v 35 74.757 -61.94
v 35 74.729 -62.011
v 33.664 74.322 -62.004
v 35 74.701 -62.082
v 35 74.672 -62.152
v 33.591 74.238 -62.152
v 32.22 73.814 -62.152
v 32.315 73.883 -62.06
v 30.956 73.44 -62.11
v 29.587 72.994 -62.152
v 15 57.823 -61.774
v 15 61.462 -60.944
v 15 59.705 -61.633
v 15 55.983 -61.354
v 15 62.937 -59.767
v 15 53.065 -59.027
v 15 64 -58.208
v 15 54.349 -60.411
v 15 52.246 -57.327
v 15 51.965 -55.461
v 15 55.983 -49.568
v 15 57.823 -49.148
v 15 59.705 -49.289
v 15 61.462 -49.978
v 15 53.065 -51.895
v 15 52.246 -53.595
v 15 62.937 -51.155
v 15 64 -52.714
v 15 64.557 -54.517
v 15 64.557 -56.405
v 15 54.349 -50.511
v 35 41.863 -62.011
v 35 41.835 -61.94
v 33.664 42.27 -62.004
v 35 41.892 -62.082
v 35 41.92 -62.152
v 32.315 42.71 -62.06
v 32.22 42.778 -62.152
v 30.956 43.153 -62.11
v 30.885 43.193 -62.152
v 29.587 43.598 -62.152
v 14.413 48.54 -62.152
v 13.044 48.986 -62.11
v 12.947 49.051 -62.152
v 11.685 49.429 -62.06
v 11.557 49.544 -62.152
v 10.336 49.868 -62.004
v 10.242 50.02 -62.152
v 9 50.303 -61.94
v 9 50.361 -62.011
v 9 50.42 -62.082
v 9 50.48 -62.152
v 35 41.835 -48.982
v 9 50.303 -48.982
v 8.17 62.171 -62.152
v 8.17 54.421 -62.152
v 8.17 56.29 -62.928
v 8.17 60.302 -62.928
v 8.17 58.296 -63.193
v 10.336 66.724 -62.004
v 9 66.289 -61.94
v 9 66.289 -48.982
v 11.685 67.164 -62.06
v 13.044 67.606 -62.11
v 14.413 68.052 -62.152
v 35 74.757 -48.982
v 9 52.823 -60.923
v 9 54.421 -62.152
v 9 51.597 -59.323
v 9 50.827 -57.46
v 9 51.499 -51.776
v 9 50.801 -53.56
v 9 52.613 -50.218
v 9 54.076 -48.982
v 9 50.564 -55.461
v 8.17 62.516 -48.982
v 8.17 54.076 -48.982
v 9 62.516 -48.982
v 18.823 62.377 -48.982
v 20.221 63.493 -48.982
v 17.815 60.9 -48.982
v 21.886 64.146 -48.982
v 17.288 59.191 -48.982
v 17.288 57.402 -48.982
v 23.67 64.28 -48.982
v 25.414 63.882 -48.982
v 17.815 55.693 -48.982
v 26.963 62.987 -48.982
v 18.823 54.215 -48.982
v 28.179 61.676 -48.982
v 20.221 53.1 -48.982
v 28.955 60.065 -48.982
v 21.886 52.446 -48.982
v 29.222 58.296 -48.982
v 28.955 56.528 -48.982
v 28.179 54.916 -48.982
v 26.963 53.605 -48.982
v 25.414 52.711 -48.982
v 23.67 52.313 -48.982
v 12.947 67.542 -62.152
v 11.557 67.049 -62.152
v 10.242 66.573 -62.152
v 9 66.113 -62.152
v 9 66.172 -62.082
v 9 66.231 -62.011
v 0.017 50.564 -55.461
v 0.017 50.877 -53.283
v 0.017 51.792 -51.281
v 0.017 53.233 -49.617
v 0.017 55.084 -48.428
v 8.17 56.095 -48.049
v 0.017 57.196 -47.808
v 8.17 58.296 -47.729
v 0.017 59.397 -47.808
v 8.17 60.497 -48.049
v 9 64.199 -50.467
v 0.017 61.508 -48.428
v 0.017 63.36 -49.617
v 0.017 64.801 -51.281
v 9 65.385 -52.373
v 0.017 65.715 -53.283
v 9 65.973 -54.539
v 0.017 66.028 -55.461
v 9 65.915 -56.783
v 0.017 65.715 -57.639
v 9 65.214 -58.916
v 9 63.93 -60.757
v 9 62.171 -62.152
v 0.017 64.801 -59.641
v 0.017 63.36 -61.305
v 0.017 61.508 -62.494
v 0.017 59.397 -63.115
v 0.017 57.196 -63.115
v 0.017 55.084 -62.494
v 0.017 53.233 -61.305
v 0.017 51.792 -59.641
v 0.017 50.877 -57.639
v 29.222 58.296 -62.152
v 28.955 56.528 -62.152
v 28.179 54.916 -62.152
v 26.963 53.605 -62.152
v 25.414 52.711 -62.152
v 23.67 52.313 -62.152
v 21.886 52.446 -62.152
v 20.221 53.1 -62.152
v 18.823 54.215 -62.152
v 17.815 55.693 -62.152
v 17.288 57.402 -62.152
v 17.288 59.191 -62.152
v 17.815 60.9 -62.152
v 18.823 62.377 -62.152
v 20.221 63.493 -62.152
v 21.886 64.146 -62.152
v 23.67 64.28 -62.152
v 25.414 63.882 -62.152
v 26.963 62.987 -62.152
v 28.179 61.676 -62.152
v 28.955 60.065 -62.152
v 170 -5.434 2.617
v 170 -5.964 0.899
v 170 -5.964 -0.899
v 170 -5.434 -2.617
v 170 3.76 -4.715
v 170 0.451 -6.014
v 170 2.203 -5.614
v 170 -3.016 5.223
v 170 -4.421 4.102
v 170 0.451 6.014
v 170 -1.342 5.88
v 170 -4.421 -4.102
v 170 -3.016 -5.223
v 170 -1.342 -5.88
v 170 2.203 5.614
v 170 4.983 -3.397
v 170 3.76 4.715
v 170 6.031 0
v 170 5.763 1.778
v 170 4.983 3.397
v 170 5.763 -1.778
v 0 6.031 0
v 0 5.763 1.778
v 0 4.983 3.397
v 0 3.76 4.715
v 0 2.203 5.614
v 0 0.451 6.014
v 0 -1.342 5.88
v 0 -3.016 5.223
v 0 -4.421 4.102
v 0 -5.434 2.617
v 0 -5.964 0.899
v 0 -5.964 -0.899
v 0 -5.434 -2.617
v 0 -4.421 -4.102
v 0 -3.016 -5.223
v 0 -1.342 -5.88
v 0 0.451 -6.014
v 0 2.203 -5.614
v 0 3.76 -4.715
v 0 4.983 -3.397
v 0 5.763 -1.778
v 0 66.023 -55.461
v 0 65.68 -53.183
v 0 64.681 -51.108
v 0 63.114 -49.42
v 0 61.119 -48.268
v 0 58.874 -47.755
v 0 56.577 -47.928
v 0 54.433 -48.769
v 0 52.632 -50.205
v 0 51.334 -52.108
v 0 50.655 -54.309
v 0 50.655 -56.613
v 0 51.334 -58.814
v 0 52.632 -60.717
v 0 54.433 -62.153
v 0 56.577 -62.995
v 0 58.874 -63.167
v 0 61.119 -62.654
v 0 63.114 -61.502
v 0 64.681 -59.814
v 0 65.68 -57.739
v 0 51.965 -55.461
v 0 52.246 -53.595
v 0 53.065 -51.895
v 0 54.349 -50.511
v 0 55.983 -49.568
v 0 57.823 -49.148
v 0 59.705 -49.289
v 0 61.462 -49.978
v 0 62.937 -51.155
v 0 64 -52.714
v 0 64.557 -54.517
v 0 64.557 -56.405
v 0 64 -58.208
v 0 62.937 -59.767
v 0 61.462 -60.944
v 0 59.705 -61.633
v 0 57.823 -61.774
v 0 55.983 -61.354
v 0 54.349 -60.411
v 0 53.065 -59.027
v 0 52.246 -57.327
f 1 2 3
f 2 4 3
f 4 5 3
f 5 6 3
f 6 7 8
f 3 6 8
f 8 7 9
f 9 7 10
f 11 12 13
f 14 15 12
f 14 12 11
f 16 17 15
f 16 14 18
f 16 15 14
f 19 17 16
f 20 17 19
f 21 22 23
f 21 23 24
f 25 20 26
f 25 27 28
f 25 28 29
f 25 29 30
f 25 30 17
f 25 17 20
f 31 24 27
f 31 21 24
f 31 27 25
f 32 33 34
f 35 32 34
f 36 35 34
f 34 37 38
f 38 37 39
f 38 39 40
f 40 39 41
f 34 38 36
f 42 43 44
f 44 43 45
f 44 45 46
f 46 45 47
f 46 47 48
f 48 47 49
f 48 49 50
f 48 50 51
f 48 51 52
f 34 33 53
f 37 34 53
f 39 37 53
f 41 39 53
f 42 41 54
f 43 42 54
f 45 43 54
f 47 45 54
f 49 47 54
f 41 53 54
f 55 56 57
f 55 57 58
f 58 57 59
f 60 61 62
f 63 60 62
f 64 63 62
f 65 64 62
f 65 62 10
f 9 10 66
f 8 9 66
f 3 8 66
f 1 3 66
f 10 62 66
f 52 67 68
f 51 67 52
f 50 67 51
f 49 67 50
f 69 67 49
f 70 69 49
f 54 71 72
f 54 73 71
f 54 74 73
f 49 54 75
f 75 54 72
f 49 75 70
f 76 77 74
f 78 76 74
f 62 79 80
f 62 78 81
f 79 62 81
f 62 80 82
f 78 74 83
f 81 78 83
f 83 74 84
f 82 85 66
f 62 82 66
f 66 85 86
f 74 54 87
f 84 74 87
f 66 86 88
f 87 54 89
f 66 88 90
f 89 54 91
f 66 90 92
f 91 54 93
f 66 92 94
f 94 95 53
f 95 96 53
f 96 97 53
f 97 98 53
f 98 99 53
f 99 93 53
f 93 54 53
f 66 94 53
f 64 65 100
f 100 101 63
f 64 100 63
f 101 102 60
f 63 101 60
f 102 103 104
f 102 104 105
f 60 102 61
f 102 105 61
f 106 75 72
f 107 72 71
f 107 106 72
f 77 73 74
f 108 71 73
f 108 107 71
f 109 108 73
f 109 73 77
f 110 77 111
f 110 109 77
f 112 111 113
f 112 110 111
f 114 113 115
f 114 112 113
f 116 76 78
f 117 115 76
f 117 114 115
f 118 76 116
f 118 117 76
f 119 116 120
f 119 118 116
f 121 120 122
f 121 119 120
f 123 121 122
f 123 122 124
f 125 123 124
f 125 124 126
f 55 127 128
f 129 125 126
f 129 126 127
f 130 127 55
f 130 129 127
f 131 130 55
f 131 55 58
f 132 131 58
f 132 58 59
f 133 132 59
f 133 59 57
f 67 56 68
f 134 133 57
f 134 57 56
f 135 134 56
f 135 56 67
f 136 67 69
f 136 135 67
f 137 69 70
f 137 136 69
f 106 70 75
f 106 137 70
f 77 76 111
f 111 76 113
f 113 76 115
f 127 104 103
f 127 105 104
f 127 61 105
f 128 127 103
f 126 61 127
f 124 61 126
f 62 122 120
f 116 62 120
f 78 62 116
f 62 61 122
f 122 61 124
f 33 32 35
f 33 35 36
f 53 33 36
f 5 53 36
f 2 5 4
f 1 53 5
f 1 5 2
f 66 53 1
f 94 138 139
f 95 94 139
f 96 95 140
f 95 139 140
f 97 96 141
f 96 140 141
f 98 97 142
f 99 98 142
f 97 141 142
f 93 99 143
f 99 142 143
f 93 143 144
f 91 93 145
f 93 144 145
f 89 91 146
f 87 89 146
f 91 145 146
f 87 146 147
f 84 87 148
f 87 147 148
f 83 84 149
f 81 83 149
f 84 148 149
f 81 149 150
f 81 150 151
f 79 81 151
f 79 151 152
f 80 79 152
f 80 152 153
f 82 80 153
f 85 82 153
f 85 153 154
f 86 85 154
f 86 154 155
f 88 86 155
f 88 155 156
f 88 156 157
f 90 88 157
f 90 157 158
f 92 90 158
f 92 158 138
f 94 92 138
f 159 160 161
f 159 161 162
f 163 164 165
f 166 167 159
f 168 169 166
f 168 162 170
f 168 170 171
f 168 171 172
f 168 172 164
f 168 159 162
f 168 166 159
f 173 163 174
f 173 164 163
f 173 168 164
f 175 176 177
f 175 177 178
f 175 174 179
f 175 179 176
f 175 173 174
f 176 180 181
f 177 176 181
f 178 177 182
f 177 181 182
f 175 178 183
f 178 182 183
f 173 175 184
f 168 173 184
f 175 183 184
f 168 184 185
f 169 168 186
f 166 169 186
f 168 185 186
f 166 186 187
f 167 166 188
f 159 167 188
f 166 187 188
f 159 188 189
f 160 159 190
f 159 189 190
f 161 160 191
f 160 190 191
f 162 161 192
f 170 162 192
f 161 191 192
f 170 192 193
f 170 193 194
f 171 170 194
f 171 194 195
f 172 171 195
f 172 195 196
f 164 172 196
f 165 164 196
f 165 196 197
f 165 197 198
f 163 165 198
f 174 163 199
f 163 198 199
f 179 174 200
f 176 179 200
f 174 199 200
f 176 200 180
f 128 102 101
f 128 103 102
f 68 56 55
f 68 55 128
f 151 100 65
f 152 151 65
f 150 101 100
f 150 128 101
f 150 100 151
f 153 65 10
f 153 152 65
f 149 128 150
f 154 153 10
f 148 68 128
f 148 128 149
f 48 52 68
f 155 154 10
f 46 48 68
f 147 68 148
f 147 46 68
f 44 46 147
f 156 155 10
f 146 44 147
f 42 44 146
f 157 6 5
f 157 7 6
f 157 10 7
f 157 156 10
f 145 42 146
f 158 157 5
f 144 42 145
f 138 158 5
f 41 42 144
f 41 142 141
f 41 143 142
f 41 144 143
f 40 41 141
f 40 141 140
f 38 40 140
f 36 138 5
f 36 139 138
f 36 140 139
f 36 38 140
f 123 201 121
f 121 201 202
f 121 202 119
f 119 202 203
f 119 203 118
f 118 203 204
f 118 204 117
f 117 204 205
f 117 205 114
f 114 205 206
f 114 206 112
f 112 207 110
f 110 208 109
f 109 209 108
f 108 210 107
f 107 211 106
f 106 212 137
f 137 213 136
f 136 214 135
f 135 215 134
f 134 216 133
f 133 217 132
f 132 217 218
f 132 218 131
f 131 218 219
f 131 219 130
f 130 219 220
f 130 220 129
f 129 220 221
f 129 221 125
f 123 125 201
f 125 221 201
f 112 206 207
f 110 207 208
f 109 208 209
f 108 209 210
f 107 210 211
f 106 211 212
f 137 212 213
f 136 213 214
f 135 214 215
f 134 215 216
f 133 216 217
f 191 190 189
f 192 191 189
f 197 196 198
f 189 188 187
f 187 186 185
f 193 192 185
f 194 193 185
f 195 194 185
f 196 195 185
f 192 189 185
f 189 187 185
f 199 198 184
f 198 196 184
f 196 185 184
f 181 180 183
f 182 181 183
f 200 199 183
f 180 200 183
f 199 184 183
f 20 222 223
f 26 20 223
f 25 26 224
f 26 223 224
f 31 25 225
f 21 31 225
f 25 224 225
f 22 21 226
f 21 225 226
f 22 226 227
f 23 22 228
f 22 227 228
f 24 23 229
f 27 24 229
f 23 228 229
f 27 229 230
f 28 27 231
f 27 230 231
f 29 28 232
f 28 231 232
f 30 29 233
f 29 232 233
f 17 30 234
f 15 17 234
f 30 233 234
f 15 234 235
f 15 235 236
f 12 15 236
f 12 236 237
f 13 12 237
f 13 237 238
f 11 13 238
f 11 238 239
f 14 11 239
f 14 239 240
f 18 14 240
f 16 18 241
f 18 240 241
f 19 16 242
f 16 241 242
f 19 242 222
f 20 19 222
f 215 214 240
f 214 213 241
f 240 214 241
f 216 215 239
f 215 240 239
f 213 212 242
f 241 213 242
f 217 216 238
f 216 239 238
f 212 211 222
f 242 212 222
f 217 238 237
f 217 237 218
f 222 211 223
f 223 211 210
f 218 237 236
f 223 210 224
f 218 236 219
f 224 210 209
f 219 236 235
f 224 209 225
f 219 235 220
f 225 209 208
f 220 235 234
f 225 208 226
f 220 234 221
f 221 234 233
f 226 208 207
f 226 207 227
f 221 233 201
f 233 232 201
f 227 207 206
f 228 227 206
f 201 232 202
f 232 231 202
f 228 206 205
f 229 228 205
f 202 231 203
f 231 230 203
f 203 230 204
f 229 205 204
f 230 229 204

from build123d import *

# Parameters (mm, degrees)
F0_R      = 6.0311238877
F1_DEPTH  = 170
F4_R      = 17.6901582165
F2_R      = 7.7272221814
F6_W      = 26.8814461306
F6_H      = 17.3603072762
F6_H_2    = 16.4670161903
F7_DEPTH  = 100
F8_R      = 11.5624340414
F8_R_2    = 7.7321638207
F9_DEPTH  = 9
F11_DEPTH = 25
F12_R     = 6.0002626076
F13_DEPTH = 25
F14_R     = 6.3310913438
F15_DEPTH = 15


with BuildPart() as f1:
    # F0 (on Right) → F1 (new body)
    with BuildSketch(Plane.YZ):
        Circle(F0_R)
    extrude(amount=F1_DEPTH)


with BuildPart() as f5:
    # F4 (on offset) → F5 section 0
    with BuildSketch(Plane.YZ.offset(35)):
        with Locations((58.296225965, -55.4610416293)):
            Circle(F4_R)
    # F2 (on Right) → F5 section 1
    with BuildSketch(Plane.YZ):
        with Locations((58.296225965, -55.4610416293)):
            Circle(F2_R)
    loft()

    # F6 (on Front) → F7 (cut)
    with BuildSketch(Plane.XZ):
        with Locations((21.6108239256, -70.8322189748)):
            Rectangle(F6_W, F6_H)
        with Locations((21.6108239256, -40.7484527677)):
            Rectangle(F6_W, F6_H_2)
    extrude(amount=-F7_DEPTH, mode=Mode.SUBTRACT)

    # F8 (on face) → F9 (cut)
    with BuildSketch(Plane(origin=(0, 0, 0), x_dir=(0, -1, 0), z_dir=(-1, 0, 0))):
        with Locations((-58.296225965, -55.4610416293)):
            Circle(F8_R)
        with Locations((-58.296225965, -55.4610416293)):
            Circle(F8_R_2, mode=Mode.SUBTRACT)
    extrude(amount=-F9_DEPTH, mode=Mode.SUBTRACT)

    # F10 (on face) → F11 (cut)
    with BuildSketch(Plane.XY.offset(-48.9819608629)):
        Polygon((9, 69.8061585426), (9, 66.2891918217), (35, 74.757186148), (35, 77.7765586972), align=None)
        Polygon((35, 41.835265782), (9, 50.3032601083), (9, 46.1107976735), (35, 38.4149104357), align=None)
    extrude(amount=-F11_DEPTH, mode=Mode.SUBTRACT)

    # F12 (on face) → F13 (cut)
    with BuildSketch(Plane(origin=(0, 0, -62.1520653367), x_dir=(1, 0, 0), z_dir=(0, 0, -1))):
        with Locations((23.2215356082, -58.296225965)):
            Circle(F12_R)
    extrude(amount=-F13_DEPTH, mode=Mode.SUBTRACT)

    # F14 (on face) → F15 (cut)
    with BuildSketch(Plane(origin=(0, 0, 0), x_dir=(0, -1, 0), z_dir=(-1, 0, 0))):
        with Locations((-58.296225965, -55.4610416293)):
            Circle(F14_R)
    extrude(amount=-F15_DEPTH, mode=Mode.SUBTRACT)


solid = Compound([f1.part, f5.part])
